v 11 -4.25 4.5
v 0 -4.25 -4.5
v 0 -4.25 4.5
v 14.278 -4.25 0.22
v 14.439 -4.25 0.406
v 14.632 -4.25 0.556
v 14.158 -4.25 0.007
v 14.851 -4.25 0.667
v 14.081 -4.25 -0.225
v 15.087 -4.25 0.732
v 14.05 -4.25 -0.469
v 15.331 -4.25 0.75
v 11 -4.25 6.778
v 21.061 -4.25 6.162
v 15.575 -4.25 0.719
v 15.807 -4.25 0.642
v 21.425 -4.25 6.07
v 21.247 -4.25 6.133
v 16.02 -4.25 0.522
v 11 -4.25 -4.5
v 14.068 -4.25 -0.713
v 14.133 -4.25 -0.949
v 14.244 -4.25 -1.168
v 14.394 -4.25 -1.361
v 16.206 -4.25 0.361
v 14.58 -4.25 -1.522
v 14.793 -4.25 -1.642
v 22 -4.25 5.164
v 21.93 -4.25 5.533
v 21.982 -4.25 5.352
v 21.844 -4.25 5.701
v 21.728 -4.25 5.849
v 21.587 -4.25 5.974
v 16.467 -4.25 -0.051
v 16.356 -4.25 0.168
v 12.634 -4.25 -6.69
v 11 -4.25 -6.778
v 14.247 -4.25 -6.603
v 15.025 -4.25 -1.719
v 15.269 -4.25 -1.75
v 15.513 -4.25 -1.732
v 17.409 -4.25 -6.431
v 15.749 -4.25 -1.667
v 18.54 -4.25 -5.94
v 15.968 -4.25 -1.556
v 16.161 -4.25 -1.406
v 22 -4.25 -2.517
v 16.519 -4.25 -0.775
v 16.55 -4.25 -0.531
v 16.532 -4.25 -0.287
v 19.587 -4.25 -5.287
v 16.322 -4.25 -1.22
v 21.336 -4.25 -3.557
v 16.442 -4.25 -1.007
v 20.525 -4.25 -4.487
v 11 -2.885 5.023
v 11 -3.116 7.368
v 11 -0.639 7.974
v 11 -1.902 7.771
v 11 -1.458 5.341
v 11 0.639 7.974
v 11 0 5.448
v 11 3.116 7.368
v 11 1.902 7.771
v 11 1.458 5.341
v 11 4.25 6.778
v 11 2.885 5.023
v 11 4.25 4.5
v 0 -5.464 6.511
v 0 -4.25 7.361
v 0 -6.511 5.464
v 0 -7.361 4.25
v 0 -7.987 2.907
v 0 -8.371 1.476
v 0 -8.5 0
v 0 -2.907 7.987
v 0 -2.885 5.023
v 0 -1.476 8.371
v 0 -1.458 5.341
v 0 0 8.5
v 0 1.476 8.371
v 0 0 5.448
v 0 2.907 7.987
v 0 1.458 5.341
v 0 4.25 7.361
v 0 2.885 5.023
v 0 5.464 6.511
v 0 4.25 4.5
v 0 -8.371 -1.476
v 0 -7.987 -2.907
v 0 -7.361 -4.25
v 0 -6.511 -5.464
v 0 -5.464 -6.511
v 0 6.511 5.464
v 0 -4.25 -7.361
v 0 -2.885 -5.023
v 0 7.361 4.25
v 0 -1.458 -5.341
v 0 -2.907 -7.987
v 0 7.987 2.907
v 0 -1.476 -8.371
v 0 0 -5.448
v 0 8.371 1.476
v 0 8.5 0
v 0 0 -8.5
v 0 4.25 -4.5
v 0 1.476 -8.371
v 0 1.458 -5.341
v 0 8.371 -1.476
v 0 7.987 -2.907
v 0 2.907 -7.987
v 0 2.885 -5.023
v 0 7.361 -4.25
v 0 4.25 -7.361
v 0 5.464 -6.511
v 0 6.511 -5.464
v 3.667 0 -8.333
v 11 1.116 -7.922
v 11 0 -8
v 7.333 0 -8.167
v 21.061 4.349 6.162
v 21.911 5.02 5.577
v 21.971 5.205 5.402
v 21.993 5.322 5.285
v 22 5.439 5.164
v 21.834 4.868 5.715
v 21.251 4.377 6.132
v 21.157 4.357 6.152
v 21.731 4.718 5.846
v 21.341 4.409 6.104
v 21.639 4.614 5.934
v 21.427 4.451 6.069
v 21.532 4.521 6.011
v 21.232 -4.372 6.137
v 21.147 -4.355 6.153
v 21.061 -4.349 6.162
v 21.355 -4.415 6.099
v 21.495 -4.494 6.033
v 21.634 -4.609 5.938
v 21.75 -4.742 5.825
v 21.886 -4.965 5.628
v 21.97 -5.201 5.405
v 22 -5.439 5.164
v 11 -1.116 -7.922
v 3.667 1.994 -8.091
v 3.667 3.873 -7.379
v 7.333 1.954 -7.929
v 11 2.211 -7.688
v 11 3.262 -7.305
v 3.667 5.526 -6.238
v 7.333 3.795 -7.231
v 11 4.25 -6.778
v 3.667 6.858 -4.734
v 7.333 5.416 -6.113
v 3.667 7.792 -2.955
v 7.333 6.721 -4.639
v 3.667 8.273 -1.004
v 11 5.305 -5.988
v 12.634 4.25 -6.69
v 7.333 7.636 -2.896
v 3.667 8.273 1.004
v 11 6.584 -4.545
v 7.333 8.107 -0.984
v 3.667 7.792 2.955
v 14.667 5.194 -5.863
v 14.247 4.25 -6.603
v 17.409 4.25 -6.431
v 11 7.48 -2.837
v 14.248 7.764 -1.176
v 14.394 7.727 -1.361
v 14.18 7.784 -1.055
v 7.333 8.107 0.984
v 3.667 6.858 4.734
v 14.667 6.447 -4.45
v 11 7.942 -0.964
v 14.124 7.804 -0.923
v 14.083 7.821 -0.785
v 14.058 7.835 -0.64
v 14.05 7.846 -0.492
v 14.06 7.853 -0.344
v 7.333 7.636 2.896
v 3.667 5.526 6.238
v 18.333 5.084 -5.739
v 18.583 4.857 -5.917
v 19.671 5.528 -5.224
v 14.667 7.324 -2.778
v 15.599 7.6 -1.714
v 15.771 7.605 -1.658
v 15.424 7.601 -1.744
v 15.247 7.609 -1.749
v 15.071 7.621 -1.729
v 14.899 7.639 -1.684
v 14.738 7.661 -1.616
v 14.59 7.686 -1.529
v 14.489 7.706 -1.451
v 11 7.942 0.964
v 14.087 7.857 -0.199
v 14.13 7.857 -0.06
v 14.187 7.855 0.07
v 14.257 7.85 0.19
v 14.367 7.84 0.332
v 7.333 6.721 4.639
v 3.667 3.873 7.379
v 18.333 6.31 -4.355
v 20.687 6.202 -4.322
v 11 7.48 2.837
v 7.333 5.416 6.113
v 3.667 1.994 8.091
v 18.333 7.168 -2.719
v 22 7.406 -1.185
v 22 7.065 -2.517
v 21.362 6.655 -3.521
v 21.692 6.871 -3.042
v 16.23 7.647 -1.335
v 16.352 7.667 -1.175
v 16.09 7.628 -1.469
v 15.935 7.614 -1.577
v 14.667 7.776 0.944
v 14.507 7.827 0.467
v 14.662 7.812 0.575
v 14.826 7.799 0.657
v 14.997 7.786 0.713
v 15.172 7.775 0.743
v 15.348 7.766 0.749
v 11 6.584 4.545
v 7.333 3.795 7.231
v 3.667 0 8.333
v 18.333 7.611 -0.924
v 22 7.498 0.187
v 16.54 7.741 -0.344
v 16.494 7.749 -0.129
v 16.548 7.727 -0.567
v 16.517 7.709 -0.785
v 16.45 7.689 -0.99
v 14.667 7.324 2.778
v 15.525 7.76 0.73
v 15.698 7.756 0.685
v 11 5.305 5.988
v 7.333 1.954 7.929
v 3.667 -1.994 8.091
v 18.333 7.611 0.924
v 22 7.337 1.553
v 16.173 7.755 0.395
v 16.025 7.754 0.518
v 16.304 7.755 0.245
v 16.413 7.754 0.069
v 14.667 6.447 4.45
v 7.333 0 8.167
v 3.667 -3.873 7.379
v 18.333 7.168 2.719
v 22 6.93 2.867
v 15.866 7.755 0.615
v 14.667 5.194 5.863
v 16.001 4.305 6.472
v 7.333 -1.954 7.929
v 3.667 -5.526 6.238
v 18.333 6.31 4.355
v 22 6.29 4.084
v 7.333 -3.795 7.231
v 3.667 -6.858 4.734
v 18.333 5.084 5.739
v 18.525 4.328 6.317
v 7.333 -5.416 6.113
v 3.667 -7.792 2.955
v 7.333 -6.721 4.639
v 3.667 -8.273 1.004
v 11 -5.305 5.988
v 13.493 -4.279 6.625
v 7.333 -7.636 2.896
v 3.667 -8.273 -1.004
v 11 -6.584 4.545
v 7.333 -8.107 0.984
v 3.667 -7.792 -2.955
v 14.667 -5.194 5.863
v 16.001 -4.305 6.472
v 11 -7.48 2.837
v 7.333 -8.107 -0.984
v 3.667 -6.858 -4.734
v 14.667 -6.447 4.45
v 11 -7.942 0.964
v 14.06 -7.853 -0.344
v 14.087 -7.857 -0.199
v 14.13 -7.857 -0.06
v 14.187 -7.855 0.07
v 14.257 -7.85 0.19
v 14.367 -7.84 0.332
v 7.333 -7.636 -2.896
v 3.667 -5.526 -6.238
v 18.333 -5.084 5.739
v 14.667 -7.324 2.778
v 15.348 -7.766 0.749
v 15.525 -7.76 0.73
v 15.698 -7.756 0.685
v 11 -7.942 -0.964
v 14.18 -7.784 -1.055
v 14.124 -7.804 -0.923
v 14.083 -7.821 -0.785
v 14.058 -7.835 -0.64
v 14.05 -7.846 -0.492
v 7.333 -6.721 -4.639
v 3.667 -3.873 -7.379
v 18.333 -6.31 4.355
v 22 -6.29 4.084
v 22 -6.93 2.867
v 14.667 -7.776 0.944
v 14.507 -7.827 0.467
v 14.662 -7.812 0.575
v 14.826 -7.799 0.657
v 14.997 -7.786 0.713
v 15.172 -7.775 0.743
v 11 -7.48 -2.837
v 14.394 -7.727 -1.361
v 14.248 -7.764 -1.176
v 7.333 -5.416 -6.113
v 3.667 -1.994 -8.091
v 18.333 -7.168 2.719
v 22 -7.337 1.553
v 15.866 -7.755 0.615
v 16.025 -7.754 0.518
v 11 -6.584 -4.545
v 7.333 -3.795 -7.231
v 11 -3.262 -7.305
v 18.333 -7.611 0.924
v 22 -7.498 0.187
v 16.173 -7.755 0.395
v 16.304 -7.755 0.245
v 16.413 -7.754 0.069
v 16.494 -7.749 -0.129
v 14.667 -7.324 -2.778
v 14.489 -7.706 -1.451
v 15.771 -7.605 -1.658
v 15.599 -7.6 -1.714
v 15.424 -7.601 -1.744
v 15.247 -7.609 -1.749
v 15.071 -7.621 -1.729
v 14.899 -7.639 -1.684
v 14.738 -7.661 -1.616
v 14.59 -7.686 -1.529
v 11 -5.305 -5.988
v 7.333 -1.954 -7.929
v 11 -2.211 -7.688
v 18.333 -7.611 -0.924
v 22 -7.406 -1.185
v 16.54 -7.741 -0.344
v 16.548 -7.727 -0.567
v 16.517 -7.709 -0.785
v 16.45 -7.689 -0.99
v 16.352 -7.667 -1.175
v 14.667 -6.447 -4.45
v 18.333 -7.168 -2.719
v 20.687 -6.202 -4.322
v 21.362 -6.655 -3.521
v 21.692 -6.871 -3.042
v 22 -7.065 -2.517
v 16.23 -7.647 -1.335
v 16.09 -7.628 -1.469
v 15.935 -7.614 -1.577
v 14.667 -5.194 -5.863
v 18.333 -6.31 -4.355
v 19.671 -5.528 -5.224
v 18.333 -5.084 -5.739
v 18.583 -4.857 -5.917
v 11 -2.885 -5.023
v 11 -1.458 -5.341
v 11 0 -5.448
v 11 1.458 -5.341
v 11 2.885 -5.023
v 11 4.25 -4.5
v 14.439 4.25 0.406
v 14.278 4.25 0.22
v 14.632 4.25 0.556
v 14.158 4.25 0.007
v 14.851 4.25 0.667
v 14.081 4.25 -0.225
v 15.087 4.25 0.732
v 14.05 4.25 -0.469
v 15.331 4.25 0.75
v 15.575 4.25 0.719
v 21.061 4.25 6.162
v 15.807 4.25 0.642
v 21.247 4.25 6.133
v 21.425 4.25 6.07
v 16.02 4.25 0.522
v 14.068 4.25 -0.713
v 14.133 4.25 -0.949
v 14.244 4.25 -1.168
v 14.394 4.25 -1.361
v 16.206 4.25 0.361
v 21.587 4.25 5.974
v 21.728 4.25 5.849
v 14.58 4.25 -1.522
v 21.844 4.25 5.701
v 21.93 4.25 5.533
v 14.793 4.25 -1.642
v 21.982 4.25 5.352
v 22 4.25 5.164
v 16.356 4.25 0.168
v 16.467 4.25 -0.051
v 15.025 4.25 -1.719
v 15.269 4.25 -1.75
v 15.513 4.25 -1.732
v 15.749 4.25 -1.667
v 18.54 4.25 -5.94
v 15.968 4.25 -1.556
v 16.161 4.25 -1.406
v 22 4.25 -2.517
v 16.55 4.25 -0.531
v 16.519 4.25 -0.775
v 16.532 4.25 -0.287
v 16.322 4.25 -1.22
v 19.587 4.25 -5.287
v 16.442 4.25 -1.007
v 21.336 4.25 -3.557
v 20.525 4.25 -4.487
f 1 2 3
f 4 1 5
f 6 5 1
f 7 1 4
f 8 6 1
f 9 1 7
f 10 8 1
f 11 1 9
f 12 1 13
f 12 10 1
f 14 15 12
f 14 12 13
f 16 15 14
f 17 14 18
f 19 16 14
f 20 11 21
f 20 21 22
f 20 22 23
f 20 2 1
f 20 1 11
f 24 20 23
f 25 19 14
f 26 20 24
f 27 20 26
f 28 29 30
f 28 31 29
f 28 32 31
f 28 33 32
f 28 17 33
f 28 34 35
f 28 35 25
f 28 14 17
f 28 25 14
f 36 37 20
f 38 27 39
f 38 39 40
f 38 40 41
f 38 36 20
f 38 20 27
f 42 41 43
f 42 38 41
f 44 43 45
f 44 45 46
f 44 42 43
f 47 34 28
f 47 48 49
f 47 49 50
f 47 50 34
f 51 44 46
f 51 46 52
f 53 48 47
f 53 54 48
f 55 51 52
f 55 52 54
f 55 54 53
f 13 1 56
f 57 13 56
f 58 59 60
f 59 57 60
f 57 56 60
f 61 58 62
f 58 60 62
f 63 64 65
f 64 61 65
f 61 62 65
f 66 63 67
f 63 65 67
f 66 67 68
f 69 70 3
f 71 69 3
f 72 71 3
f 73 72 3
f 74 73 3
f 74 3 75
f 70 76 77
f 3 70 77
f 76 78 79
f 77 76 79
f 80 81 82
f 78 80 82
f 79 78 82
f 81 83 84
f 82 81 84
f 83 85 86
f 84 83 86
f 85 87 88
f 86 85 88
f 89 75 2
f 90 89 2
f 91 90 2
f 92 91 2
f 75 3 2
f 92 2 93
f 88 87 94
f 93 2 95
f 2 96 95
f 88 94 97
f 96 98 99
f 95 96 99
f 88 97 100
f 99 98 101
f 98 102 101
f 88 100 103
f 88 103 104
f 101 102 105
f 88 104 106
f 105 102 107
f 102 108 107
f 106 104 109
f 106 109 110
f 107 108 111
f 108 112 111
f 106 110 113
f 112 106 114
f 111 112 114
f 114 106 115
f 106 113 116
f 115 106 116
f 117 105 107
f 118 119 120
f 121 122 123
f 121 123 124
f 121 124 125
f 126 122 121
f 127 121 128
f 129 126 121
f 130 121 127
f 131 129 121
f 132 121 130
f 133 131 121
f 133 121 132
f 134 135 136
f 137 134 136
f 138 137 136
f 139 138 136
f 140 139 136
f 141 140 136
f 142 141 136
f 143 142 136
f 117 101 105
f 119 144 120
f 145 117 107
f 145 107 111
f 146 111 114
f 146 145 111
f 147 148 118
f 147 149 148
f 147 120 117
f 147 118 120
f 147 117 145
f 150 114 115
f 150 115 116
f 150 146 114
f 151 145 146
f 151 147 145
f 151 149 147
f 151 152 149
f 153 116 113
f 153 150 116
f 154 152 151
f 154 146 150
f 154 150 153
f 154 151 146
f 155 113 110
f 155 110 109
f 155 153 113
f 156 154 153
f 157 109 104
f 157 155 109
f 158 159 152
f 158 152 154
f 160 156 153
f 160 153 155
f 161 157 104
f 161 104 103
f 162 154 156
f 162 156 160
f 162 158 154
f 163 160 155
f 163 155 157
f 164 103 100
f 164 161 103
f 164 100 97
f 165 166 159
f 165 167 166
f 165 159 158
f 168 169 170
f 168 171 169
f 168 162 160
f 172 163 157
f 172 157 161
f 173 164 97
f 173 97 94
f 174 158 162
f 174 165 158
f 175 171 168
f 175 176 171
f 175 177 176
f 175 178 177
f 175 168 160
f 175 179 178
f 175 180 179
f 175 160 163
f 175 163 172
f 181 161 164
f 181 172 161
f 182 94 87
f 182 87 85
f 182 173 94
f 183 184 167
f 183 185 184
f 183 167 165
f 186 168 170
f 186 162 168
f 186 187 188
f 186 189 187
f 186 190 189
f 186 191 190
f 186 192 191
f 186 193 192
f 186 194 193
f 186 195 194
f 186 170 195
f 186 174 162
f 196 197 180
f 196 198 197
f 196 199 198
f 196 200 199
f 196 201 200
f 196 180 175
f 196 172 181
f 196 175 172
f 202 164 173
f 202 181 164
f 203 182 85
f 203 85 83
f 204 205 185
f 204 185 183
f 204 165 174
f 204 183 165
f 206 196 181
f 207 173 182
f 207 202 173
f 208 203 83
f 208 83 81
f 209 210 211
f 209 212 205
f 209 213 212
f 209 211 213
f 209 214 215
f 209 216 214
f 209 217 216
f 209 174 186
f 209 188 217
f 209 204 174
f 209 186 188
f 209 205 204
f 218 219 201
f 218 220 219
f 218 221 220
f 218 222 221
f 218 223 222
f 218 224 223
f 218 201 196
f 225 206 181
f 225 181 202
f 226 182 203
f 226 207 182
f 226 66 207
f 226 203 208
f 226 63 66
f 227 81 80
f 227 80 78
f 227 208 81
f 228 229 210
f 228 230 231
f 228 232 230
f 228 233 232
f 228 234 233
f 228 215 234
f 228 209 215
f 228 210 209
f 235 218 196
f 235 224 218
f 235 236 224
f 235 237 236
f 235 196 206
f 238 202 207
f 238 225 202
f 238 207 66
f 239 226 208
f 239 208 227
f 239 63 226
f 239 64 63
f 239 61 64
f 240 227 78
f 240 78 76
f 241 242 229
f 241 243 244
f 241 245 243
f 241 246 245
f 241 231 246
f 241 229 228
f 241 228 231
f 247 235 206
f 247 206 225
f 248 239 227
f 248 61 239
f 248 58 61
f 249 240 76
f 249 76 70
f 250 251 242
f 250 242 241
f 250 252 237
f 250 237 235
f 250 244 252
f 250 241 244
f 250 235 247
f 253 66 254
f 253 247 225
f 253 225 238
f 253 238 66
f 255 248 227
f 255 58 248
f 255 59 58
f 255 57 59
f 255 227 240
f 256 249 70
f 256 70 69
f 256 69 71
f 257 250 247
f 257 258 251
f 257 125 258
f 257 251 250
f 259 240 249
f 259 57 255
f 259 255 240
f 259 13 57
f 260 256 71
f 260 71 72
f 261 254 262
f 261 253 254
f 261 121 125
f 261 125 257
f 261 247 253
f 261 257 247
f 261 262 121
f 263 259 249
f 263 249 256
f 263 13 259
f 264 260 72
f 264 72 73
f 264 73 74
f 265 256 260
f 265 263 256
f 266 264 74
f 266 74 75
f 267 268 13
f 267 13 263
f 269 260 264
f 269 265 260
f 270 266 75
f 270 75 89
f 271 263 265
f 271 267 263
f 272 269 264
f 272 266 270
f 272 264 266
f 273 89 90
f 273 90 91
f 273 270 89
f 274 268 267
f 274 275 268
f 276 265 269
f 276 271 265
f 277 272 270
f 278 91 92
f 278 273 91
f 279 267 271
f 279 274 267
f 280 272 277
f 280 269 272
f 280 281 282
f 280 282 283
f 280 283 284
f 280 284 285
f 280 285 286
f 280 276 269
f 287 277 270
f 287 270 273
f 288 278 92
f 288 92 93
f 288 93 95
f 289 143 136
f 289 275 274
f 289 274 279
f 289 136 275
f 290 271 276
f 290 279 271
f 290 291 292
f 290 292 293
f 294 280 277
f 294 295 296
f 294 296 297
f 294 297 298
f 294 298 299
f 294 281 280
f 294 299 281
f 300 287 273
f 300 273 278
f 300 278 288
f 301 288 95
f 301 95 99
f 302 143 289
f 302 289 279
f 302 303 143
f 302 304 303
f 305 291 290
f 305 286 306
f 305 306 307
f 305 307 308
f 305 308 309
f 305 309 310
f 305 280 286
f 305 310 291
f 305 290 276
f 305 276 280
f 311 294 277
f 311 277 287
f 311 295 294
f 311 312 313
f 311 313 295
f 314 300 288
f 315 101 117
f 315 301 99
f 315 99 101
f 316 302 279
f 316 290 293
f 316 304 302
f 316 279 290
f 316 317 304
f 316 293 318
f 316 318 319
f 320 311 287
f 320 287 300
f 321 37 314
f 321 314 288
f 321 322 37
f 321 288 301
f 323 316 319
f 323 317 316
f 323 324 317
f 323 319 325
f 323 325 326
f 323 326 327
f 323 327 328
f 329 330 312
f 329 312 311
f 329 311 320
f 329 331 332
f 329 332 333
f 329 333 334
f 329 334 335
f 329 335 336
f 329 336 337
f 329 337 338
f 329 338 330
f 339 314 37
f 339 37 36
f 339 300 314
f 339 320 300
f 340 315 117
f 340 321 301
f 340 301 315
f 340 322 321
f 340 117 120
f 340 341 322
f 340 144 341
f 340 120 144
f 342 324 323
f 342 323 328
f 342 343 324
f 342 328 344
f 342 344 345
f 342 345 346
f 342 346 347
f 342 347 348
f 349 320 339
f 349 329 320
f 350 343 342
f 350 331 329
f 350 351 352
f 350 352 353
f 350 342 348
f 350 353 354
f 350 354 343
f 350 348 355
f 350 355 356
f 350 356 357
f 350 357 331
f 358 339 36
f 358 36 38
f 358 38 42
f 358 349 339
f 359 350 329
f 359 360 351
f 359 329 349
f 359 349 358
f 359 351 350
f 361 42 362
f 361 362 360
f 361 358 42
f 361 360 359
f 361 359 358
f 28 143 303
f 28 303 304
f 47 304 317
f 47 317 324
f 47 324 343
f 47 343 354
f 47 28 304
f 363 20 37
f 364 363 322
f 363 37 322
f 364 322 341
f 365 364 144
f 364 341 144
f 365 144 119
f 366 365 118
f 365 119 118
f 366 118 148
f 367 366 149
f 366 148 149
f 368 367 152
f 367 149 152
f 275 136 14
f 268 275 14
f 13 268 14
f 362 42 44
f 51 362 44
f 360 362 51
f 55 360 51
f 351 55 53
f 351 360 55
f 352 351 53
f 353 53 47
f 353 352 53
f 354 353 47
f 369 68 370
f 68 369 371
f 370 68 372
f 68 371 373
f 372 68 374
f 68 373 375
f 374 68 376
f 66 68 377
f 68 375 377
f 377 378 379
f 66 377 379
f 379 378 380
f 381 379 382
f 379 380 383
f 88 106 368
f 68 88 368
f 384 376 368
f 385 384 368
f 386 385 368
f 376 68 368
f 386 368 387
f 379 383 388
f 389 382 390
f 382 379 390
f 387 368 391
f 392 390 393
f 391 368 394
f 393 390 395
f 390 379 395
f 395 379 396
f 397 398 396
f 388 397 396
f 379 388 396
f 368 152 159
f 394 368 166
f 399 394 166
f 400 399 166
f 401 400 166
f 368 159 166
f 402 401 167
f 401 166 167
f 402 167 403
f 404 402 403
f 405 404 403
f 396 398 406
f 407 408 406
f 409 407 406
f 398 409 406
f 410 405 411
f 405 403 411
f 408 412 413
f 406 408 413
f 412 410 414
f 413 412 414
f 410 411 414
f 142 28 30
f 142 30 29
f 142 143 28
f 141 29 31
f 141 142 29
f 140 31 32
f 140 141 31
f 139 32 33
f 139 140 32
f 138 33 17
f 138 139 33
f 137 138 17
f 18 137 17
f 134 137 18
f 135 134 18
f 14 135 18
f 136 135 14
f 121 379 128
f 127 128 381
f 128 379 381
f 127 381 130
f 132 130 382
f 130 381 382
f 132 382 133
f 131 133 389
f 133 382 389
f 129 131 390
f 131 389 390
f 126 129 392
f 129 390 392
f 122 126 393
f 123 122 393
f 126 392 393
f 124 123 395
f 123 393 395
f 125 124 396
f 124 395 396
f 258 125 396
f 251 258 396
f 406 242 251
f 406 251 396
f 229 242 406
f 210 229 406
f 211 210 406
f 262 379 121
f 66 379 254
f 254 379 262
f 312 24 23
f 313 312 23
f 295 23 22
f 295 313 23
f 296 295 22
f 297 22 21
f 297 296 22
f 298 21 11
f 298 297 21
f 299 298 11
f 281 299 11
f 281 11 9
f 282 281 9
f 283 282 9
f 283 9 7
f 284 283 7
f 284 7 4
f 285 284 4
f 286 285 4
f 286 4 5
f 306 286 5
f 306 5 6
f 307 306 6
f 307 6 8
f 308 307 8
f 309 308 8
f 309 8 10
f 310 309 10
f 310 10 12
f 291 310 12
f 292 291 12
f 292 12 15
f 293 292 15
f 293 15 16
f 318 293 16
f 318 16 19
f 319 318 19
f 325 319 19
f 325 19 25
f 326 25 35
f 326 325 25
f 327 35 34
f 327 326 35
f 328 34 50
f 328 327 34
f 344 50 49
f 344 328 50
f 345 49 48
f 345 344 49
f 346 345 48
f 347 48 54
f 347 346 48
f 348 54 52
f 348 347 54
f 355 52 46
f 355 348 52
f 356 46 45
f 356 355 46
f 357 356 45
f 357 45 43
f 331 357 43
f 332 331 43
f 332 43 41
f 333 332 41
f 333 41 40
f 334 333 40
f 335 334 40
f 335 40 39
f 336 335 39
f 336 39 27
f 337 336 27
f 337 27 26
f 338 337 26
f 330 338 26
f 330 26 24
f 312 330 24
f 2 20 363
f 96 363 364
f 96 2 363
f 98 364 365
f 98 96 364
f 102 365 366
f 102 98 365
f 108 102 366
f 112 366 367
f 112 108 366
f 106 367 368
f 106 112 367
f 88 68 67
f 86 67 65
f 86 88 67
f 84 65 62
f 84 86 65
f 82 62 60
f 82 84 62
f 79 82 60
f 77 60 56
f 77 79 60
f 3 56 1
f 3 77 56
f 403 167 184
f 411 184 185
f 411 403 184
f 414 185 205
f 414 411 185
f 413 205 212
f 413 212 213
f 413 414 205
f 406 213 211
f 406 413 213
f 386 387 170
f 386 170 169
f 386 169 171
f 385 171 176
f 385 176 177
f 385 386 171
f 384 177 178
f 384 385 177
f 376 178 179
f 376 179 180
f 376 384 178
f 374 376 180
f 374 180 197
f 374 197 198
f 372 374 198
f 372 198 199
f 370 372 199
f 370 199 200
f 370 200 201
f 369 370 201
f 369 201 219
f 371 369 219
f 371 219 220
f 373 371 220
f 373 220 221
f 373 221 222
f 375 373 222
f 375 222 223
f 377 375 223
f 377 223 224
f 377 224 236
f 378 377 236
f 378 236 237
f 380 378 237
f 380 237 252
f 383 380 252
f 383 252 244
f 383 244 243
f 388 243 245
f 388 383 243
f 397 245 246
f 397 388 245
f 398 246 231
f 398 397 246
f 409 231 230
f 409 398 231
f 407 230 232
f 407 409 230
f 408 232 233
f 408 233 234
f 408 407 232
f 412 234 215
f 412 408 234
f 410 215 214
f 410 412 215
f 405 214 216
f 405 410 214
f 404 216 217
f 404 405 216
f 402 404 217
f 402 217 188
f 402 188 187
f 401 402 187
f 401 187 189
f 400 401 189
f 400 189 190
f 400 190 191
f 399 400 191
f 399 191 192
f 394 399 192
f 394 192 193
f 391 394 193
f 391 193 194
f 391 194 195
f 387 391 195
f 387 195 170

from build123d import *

# Parameters (mm, degrees)
SKETCH4_R               = 8.5
SKETCH5_R               = 7.5
CUT_EXTRUDE1_DEPTH      = 10
CUT_EXTRUDE1_DEPTH_BACK = 10
SKETCH7_W               = 13.763410073
SKETCH7_H               = 8.5
CUT_EXTRUDE4_DEPTH      = 10
CUT_EXTRUDE4_DEPTH_BACK = 10
CUT_EXTRUDE5_DEPTH      = 10
CUT_EXTRUDE5_DEPTH_BACK = 10
SKETCH11_R              = 1.25
CUT_EXTRUDE6_DEPTH      = 26.069902429
FILLET1_R               = 1


with BuildPart() as part:
    # Sketch4 → Loft1 section 0
    with BuildSketch(Plane(origin=(0, 0, 0), x_dir=(0, 0, -1), z_dir=(1, 0, 0))):
        Circle(SKETCH4_R)
    # Sketch5 → Loft1 section 1
    with BuildSketch(Plane(origin=(22, 0, 0), x_dir=(0, 0, -1), z_dir=(1, 0, 0))):
        Circle(SKETCH5_R)
    loft()

    # Sketch7 → Cut-Extrude1 (cut, two sides: drawn at the far end of the back side and taken through both)
    with BuildSketch(Plane.XY.offset(-CUT_EXTRUDE1_DEPTH_BACK)):
        with Locations((17.881705037, 0)):
            Rectangle(SKETCH7_W, SKETCH7_H)
    extrude(amount=CUT_EXTRUDE1_DEPTH + CUT_EXTRUDE1_DEPTH_BACK, mode=Mode.SUBTRACT)

    # Sketch8 → Cut-Extrude4 (cut, two sides: drawn at the far end of the back side and taken through both)
    with BuildSketch(Plane(origin=(0, 0, 0), x_dir=(1, 0, 0), z_dir=(0, 1, 0)).offset(-CUT_EXTRUDE4_DEPTH_BACK)):
        with BuildLine():
            Line((11, 6.777720856), (16.53, 6.685056145))
            ThreePointArc((16.53, 6.685056145), (21.20100697, 3.731621267), (23, -1.493769414))
            Line((23, -1.493769414), (23, -6.043769414))
            Line((23, -6.043769414), (11, -6.777720856))
            Line((11, -6.777720856), (11, -9.08468988))
            Line((11, -9.08468988), (27.197187836, -9.08468988))
            Line((27.197187836, -9.08468988), (27.197187836, 11.602386845))
            Line((27.197187836, 11.602386845), (11, 11.602386845))
            Line((11, 11.602386845), (11, 6.777720856))
        make_face()
    extrude(amount=CUT_EXTRUDE4_DEPTH + CUT_EXTRUDE4_DEPTH_BACK, mode=Mode.SUBTRACT)

    # Sketch11 → Cut-Extrude5 (cut, two sides: drawn at the far end of the back side and taken through both)
    with BuildSketch(Plane(origin=(0, 0, 0), x_dir=(1, 0, 0), z_dir=(0, 1, 0)).offset(-CUT_EXTRUDE5_DEPTH_BACK)):
        with Locations(Location((15.3, 0.5, 0), (0, 0, 136.441515333))):
            Circle(SKETCH11_R)
    extrude(amount=CUT_EXTRUDE5_DEPTH + CUT_EXTRUDE5_DEPTH_BACK, mode=Mode.SUBTRACT)

    # Sketch12 → Cut-Extrude6 (cut, through all)
    with BuildSketch(Plane.ZY):
        with BuildLine():
            Line((-4.5, 4.25), (4.5, 4.25))
            ThreePointArc((4.5, 4.25), (5.448066505, 0), (4.5, -4.25))
            Line((4.5, -4.25), (-4.5, -4.25))
            ThreePointArc((-4.5, -4.25), (-5.448066505, 0), (-4.5, 4.25))
        make_face()
    extrude(amount=-CUT_EXTRUDE6_DEPTH, mode=Mode.SUBTRACT)

    # Fillet1
    fillet1_edges = [part.edges().sort_by_distance(p)[0] for p in [
        (22, -4.303290893, 6.104932034),
        (22, 4.303290893, 6.104932034),
    ]]
    fillet(fillet1_edges, radius=FILLET1_R)


solid = part.part
